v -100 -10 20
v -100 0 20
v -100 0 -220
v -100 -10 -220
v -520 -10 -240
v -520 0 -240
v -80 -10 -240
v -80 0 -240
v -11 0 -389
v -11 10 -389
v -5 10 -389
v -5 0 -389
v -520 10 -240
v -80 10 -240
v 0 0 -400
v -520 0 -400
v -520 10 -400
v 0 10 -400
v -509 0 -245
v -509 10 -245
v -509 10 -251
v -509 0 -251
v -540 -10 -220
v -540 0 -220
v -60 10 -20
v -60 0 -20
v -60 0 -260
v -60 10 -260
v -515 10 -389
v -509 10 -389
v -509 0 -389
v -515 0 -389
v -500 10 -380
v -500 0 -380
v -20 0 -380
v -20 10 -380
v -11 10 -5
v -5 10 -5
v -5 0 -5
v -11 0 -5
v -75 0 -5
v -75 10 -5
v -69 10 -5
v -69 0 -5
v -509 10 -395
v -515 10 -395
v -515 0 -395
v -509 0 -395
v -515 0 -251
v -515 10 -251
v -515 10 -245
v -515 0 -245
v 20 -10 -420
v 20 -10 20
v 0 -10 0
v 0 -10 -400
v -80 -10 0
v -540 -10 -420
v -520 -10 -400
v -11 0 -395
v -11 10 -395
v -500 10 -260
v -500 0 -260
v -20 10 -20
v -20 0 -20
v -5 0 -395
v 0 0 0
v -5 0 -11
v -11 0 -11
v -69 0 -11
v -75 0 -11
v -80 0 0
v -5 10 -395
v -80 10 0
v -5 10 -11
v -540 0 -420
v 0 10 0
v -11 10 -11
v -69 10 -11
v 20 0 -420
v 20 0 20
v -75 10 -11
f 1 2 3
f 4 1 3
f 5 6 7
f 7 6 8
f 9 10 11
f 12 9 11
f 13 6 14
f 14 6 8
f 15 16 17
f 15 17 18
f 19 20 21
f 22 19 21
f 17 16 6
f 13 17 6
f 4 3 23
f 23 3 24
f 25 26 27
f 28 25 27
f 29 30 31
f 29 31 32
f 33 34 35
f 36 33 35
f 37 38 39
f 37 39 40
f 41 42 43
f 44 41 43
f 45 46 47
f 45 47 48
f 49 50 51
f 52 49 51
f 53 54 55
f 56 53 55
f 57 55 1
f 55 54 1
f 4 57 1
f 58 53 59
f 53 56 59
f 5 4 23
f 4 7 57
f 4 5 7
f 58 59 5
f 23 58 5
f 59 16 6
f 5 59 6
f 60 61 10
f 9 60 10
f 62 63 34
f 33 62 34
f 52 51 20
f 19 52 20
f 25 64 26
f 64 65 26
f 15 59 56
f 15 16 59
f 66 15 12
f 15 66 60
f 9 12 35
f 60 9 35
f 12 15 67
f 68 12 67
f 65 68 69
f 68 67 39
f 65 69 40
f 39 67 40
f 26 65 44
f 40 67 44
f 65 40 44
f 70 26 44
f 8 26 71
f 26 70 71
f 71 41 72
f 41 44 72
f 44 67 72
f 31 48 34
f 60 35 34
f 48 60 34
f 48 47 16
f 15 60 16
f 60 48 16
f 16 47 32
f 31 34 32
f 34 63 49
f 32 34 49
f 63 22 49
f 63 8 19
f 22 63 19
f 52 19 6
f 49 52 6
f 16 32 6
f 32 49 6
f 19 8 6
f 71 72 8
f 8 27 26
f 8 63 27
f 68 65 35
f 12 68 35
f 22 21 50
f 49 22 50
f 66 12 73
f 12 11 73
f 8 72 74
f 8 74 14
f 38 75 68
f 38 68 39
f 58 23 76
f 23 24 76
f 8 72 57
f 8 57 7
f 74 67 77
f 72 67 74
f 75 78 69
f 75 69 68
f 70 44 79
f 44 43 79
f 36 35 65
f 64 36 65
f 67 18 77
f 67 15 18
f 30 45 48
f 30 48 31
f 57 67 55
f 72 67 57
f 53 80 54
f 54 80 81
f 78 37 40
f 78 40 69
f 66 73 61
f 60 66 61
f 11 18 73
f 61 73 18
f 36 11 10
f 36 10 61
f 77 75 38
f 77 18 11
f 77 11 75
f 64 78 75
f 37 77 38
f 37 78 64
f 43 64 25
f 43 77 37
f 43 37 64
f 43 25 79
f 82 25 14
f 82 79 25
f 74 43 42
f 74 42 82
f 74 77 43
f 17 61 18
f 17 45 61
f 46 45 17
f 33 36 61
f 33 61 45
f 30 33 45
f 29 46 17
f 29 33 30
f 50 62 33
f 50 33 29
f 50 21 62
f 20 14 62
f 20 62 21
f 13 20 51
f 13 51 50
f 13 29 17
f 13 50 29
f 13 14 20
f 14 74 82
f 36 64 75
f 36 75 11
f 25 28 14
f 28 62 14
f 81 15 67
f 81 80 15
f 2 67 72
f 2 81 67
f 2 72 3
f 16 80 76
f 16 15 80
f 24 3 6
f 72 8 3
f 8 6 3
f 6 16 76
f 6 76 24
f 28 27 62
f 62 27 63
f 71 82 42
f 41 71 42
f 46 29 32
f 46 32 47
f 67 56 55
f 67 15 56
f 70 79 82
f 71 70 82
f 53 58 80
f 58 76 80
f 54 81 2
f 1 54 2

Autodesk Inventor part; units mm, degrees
ref_plane "YZ Plane" through (0, 0, 0) normal (1, 0, 0) x (0, 1, 0)
ref_plane "XZ Plane" through (0, 0, 0) normal (0, 1, 0) x (-1, 0, 0)
ref_plane "XY Plane" through (0, 0, 0) normal (0, 0, 1) x (1, 0, 0)
sketch "Sketch1" plane through (0, 0, 0) normal (0, 1, 0) x (-1, 0, 0)
  line L0 (0, 0) -> (80, 0)
  line L1 (80, 0) -> (80, -240)
  line L2 (80, -400) -> (0, -400)
  line L3 (0, -400) -> (0, 0)
  line L4 (80, -400) -> (520, -400)
  line L5 (520, -400) -> (520, -240)
  line L6 (520, -240) -> (80, -240)
  line L7 (540, -420) -> (80, -420)
  line L8 (80, -420) -> (-20, -420)
  line L9 (-20, -420) -> (-20, 20)
  line L10 (-20, 20) -> (100, 20)
  line L11 (100, 20) -> (100, -220)
  line L12 (100, -220) -> (540, -220)
  line L13 (540, -220) -> (540, -420)
  line L14 (500, -380) -> (80, -380)
  line L15 (80, -380) -> (20, -380)
  line L16 (20, -380) -> (20, -20)
  line L17 (20, -20) -> (60, -20)
  line L18 (60, -20) -> (60, -260)
  line L19 (60, -260) -> (500, -260)
  line L20 (500, -260) -> (500, -380)
  dimension "d5" = 400
  dimension "d6" = 160
  dimension "d7" = 80
  dimension "d8" = 440
  dimension "d9" = 20
  dimension "d10" = 20
extrude "Extrusion2" add sketch "Sketch1" against normal blind 10 contours L7 L8 L9 L10 L11 L12 L13
extrude "Extrusion3" add sketch "Sketch1" along normal blind 10 contours L0 L1 L6 L5 L4 L2 L3
sketch "Sketch2" plane through (0, 10, 0) normal (0, 1, 0) x (1, 0, 0)
  line L0 (-11, 11) -> (-5, 11)
  line L1 (-5, 11) -> (-5, 5)
  line L2 (-5, 5) -> (-11, 5)
  line L3 (-11, 5) -> (-11, 11)
  line L4 (-520, 400) -> (-520, 240) projected
  line L5 (-520, 240) -> (-80, 240) projected
  line L6 (-80, 240) -> (-80, 0) projected
  line L7 (-80, 0) -> (0, 0) projected
  line L8 (0, 0) -> (0, 400) projected
  line L9 (0, 400) -> (-520, 400) projected
  line L10 (-500, 380) -> (-20, 380) projected
  line L11 (-20, 380) -> (-20, 20) projected
  line L12 (-20, 20) -> (-60, 20) projected
  line L13 (-60, 20) -> (-60, 260) projected
  line L14 (-60, 260) -> (-500, 260) projected
  line L15 (-500, 260) -> (-500, 380) projected
  line L16 (-40, 0) -> (-40, 400)
  line L17 (-69, 11) -> (-75, 11)
  line L18 (-75, 11) -> (-75, 5)
  line L19 (-75, 5) -> (-69, 5)
  line L20 (-69, 5) -> (-69, 11)
  line L21 (-40, 200) -> (0, 200)
  line L22 (-11, 389) -> (-5, 389)
  line L23 (-5, 389) -> (-5, 395)
  line L24 (-5, 395) -> (-11, 395)
  line L25 (-11, 395) -> (-11, 389)
  line L26 (-500, 320) -> (-40, 320)
  line L27 (-509, 389) -> (-515, 389)
  line L28 (-515, 389) -> (-515, 395)
  line L29 (-515, 395) -> (-509, 395)
  line L30 (-509, 395) -> (-509, 389)
  line L31 (-509, 251) -> (-515, 251)
  line L32 (-515, 251) -> (-515, 245)
  line L33 (-515, 245) -> (-509, 245)
  line L34 (-509, 245) -> (-509, 251)
  dimension "d19" = 6
  dimension "d20" = 6
  dimension "d21" = 5
  dimension "d22" = 11
  dimension "d23" = 6
  dimension "d24" = 11
  dimension "d25" = 11
extrude "Extrusion4" cut sketch "Sketch2" against normal through all contours L0 L1 L2 L3 | L20 L19 L18 L17 | L25 L24 L23 L22 | L27 L28 L29 L30 | L34 L33 L32 L31
properties part number "base down"
